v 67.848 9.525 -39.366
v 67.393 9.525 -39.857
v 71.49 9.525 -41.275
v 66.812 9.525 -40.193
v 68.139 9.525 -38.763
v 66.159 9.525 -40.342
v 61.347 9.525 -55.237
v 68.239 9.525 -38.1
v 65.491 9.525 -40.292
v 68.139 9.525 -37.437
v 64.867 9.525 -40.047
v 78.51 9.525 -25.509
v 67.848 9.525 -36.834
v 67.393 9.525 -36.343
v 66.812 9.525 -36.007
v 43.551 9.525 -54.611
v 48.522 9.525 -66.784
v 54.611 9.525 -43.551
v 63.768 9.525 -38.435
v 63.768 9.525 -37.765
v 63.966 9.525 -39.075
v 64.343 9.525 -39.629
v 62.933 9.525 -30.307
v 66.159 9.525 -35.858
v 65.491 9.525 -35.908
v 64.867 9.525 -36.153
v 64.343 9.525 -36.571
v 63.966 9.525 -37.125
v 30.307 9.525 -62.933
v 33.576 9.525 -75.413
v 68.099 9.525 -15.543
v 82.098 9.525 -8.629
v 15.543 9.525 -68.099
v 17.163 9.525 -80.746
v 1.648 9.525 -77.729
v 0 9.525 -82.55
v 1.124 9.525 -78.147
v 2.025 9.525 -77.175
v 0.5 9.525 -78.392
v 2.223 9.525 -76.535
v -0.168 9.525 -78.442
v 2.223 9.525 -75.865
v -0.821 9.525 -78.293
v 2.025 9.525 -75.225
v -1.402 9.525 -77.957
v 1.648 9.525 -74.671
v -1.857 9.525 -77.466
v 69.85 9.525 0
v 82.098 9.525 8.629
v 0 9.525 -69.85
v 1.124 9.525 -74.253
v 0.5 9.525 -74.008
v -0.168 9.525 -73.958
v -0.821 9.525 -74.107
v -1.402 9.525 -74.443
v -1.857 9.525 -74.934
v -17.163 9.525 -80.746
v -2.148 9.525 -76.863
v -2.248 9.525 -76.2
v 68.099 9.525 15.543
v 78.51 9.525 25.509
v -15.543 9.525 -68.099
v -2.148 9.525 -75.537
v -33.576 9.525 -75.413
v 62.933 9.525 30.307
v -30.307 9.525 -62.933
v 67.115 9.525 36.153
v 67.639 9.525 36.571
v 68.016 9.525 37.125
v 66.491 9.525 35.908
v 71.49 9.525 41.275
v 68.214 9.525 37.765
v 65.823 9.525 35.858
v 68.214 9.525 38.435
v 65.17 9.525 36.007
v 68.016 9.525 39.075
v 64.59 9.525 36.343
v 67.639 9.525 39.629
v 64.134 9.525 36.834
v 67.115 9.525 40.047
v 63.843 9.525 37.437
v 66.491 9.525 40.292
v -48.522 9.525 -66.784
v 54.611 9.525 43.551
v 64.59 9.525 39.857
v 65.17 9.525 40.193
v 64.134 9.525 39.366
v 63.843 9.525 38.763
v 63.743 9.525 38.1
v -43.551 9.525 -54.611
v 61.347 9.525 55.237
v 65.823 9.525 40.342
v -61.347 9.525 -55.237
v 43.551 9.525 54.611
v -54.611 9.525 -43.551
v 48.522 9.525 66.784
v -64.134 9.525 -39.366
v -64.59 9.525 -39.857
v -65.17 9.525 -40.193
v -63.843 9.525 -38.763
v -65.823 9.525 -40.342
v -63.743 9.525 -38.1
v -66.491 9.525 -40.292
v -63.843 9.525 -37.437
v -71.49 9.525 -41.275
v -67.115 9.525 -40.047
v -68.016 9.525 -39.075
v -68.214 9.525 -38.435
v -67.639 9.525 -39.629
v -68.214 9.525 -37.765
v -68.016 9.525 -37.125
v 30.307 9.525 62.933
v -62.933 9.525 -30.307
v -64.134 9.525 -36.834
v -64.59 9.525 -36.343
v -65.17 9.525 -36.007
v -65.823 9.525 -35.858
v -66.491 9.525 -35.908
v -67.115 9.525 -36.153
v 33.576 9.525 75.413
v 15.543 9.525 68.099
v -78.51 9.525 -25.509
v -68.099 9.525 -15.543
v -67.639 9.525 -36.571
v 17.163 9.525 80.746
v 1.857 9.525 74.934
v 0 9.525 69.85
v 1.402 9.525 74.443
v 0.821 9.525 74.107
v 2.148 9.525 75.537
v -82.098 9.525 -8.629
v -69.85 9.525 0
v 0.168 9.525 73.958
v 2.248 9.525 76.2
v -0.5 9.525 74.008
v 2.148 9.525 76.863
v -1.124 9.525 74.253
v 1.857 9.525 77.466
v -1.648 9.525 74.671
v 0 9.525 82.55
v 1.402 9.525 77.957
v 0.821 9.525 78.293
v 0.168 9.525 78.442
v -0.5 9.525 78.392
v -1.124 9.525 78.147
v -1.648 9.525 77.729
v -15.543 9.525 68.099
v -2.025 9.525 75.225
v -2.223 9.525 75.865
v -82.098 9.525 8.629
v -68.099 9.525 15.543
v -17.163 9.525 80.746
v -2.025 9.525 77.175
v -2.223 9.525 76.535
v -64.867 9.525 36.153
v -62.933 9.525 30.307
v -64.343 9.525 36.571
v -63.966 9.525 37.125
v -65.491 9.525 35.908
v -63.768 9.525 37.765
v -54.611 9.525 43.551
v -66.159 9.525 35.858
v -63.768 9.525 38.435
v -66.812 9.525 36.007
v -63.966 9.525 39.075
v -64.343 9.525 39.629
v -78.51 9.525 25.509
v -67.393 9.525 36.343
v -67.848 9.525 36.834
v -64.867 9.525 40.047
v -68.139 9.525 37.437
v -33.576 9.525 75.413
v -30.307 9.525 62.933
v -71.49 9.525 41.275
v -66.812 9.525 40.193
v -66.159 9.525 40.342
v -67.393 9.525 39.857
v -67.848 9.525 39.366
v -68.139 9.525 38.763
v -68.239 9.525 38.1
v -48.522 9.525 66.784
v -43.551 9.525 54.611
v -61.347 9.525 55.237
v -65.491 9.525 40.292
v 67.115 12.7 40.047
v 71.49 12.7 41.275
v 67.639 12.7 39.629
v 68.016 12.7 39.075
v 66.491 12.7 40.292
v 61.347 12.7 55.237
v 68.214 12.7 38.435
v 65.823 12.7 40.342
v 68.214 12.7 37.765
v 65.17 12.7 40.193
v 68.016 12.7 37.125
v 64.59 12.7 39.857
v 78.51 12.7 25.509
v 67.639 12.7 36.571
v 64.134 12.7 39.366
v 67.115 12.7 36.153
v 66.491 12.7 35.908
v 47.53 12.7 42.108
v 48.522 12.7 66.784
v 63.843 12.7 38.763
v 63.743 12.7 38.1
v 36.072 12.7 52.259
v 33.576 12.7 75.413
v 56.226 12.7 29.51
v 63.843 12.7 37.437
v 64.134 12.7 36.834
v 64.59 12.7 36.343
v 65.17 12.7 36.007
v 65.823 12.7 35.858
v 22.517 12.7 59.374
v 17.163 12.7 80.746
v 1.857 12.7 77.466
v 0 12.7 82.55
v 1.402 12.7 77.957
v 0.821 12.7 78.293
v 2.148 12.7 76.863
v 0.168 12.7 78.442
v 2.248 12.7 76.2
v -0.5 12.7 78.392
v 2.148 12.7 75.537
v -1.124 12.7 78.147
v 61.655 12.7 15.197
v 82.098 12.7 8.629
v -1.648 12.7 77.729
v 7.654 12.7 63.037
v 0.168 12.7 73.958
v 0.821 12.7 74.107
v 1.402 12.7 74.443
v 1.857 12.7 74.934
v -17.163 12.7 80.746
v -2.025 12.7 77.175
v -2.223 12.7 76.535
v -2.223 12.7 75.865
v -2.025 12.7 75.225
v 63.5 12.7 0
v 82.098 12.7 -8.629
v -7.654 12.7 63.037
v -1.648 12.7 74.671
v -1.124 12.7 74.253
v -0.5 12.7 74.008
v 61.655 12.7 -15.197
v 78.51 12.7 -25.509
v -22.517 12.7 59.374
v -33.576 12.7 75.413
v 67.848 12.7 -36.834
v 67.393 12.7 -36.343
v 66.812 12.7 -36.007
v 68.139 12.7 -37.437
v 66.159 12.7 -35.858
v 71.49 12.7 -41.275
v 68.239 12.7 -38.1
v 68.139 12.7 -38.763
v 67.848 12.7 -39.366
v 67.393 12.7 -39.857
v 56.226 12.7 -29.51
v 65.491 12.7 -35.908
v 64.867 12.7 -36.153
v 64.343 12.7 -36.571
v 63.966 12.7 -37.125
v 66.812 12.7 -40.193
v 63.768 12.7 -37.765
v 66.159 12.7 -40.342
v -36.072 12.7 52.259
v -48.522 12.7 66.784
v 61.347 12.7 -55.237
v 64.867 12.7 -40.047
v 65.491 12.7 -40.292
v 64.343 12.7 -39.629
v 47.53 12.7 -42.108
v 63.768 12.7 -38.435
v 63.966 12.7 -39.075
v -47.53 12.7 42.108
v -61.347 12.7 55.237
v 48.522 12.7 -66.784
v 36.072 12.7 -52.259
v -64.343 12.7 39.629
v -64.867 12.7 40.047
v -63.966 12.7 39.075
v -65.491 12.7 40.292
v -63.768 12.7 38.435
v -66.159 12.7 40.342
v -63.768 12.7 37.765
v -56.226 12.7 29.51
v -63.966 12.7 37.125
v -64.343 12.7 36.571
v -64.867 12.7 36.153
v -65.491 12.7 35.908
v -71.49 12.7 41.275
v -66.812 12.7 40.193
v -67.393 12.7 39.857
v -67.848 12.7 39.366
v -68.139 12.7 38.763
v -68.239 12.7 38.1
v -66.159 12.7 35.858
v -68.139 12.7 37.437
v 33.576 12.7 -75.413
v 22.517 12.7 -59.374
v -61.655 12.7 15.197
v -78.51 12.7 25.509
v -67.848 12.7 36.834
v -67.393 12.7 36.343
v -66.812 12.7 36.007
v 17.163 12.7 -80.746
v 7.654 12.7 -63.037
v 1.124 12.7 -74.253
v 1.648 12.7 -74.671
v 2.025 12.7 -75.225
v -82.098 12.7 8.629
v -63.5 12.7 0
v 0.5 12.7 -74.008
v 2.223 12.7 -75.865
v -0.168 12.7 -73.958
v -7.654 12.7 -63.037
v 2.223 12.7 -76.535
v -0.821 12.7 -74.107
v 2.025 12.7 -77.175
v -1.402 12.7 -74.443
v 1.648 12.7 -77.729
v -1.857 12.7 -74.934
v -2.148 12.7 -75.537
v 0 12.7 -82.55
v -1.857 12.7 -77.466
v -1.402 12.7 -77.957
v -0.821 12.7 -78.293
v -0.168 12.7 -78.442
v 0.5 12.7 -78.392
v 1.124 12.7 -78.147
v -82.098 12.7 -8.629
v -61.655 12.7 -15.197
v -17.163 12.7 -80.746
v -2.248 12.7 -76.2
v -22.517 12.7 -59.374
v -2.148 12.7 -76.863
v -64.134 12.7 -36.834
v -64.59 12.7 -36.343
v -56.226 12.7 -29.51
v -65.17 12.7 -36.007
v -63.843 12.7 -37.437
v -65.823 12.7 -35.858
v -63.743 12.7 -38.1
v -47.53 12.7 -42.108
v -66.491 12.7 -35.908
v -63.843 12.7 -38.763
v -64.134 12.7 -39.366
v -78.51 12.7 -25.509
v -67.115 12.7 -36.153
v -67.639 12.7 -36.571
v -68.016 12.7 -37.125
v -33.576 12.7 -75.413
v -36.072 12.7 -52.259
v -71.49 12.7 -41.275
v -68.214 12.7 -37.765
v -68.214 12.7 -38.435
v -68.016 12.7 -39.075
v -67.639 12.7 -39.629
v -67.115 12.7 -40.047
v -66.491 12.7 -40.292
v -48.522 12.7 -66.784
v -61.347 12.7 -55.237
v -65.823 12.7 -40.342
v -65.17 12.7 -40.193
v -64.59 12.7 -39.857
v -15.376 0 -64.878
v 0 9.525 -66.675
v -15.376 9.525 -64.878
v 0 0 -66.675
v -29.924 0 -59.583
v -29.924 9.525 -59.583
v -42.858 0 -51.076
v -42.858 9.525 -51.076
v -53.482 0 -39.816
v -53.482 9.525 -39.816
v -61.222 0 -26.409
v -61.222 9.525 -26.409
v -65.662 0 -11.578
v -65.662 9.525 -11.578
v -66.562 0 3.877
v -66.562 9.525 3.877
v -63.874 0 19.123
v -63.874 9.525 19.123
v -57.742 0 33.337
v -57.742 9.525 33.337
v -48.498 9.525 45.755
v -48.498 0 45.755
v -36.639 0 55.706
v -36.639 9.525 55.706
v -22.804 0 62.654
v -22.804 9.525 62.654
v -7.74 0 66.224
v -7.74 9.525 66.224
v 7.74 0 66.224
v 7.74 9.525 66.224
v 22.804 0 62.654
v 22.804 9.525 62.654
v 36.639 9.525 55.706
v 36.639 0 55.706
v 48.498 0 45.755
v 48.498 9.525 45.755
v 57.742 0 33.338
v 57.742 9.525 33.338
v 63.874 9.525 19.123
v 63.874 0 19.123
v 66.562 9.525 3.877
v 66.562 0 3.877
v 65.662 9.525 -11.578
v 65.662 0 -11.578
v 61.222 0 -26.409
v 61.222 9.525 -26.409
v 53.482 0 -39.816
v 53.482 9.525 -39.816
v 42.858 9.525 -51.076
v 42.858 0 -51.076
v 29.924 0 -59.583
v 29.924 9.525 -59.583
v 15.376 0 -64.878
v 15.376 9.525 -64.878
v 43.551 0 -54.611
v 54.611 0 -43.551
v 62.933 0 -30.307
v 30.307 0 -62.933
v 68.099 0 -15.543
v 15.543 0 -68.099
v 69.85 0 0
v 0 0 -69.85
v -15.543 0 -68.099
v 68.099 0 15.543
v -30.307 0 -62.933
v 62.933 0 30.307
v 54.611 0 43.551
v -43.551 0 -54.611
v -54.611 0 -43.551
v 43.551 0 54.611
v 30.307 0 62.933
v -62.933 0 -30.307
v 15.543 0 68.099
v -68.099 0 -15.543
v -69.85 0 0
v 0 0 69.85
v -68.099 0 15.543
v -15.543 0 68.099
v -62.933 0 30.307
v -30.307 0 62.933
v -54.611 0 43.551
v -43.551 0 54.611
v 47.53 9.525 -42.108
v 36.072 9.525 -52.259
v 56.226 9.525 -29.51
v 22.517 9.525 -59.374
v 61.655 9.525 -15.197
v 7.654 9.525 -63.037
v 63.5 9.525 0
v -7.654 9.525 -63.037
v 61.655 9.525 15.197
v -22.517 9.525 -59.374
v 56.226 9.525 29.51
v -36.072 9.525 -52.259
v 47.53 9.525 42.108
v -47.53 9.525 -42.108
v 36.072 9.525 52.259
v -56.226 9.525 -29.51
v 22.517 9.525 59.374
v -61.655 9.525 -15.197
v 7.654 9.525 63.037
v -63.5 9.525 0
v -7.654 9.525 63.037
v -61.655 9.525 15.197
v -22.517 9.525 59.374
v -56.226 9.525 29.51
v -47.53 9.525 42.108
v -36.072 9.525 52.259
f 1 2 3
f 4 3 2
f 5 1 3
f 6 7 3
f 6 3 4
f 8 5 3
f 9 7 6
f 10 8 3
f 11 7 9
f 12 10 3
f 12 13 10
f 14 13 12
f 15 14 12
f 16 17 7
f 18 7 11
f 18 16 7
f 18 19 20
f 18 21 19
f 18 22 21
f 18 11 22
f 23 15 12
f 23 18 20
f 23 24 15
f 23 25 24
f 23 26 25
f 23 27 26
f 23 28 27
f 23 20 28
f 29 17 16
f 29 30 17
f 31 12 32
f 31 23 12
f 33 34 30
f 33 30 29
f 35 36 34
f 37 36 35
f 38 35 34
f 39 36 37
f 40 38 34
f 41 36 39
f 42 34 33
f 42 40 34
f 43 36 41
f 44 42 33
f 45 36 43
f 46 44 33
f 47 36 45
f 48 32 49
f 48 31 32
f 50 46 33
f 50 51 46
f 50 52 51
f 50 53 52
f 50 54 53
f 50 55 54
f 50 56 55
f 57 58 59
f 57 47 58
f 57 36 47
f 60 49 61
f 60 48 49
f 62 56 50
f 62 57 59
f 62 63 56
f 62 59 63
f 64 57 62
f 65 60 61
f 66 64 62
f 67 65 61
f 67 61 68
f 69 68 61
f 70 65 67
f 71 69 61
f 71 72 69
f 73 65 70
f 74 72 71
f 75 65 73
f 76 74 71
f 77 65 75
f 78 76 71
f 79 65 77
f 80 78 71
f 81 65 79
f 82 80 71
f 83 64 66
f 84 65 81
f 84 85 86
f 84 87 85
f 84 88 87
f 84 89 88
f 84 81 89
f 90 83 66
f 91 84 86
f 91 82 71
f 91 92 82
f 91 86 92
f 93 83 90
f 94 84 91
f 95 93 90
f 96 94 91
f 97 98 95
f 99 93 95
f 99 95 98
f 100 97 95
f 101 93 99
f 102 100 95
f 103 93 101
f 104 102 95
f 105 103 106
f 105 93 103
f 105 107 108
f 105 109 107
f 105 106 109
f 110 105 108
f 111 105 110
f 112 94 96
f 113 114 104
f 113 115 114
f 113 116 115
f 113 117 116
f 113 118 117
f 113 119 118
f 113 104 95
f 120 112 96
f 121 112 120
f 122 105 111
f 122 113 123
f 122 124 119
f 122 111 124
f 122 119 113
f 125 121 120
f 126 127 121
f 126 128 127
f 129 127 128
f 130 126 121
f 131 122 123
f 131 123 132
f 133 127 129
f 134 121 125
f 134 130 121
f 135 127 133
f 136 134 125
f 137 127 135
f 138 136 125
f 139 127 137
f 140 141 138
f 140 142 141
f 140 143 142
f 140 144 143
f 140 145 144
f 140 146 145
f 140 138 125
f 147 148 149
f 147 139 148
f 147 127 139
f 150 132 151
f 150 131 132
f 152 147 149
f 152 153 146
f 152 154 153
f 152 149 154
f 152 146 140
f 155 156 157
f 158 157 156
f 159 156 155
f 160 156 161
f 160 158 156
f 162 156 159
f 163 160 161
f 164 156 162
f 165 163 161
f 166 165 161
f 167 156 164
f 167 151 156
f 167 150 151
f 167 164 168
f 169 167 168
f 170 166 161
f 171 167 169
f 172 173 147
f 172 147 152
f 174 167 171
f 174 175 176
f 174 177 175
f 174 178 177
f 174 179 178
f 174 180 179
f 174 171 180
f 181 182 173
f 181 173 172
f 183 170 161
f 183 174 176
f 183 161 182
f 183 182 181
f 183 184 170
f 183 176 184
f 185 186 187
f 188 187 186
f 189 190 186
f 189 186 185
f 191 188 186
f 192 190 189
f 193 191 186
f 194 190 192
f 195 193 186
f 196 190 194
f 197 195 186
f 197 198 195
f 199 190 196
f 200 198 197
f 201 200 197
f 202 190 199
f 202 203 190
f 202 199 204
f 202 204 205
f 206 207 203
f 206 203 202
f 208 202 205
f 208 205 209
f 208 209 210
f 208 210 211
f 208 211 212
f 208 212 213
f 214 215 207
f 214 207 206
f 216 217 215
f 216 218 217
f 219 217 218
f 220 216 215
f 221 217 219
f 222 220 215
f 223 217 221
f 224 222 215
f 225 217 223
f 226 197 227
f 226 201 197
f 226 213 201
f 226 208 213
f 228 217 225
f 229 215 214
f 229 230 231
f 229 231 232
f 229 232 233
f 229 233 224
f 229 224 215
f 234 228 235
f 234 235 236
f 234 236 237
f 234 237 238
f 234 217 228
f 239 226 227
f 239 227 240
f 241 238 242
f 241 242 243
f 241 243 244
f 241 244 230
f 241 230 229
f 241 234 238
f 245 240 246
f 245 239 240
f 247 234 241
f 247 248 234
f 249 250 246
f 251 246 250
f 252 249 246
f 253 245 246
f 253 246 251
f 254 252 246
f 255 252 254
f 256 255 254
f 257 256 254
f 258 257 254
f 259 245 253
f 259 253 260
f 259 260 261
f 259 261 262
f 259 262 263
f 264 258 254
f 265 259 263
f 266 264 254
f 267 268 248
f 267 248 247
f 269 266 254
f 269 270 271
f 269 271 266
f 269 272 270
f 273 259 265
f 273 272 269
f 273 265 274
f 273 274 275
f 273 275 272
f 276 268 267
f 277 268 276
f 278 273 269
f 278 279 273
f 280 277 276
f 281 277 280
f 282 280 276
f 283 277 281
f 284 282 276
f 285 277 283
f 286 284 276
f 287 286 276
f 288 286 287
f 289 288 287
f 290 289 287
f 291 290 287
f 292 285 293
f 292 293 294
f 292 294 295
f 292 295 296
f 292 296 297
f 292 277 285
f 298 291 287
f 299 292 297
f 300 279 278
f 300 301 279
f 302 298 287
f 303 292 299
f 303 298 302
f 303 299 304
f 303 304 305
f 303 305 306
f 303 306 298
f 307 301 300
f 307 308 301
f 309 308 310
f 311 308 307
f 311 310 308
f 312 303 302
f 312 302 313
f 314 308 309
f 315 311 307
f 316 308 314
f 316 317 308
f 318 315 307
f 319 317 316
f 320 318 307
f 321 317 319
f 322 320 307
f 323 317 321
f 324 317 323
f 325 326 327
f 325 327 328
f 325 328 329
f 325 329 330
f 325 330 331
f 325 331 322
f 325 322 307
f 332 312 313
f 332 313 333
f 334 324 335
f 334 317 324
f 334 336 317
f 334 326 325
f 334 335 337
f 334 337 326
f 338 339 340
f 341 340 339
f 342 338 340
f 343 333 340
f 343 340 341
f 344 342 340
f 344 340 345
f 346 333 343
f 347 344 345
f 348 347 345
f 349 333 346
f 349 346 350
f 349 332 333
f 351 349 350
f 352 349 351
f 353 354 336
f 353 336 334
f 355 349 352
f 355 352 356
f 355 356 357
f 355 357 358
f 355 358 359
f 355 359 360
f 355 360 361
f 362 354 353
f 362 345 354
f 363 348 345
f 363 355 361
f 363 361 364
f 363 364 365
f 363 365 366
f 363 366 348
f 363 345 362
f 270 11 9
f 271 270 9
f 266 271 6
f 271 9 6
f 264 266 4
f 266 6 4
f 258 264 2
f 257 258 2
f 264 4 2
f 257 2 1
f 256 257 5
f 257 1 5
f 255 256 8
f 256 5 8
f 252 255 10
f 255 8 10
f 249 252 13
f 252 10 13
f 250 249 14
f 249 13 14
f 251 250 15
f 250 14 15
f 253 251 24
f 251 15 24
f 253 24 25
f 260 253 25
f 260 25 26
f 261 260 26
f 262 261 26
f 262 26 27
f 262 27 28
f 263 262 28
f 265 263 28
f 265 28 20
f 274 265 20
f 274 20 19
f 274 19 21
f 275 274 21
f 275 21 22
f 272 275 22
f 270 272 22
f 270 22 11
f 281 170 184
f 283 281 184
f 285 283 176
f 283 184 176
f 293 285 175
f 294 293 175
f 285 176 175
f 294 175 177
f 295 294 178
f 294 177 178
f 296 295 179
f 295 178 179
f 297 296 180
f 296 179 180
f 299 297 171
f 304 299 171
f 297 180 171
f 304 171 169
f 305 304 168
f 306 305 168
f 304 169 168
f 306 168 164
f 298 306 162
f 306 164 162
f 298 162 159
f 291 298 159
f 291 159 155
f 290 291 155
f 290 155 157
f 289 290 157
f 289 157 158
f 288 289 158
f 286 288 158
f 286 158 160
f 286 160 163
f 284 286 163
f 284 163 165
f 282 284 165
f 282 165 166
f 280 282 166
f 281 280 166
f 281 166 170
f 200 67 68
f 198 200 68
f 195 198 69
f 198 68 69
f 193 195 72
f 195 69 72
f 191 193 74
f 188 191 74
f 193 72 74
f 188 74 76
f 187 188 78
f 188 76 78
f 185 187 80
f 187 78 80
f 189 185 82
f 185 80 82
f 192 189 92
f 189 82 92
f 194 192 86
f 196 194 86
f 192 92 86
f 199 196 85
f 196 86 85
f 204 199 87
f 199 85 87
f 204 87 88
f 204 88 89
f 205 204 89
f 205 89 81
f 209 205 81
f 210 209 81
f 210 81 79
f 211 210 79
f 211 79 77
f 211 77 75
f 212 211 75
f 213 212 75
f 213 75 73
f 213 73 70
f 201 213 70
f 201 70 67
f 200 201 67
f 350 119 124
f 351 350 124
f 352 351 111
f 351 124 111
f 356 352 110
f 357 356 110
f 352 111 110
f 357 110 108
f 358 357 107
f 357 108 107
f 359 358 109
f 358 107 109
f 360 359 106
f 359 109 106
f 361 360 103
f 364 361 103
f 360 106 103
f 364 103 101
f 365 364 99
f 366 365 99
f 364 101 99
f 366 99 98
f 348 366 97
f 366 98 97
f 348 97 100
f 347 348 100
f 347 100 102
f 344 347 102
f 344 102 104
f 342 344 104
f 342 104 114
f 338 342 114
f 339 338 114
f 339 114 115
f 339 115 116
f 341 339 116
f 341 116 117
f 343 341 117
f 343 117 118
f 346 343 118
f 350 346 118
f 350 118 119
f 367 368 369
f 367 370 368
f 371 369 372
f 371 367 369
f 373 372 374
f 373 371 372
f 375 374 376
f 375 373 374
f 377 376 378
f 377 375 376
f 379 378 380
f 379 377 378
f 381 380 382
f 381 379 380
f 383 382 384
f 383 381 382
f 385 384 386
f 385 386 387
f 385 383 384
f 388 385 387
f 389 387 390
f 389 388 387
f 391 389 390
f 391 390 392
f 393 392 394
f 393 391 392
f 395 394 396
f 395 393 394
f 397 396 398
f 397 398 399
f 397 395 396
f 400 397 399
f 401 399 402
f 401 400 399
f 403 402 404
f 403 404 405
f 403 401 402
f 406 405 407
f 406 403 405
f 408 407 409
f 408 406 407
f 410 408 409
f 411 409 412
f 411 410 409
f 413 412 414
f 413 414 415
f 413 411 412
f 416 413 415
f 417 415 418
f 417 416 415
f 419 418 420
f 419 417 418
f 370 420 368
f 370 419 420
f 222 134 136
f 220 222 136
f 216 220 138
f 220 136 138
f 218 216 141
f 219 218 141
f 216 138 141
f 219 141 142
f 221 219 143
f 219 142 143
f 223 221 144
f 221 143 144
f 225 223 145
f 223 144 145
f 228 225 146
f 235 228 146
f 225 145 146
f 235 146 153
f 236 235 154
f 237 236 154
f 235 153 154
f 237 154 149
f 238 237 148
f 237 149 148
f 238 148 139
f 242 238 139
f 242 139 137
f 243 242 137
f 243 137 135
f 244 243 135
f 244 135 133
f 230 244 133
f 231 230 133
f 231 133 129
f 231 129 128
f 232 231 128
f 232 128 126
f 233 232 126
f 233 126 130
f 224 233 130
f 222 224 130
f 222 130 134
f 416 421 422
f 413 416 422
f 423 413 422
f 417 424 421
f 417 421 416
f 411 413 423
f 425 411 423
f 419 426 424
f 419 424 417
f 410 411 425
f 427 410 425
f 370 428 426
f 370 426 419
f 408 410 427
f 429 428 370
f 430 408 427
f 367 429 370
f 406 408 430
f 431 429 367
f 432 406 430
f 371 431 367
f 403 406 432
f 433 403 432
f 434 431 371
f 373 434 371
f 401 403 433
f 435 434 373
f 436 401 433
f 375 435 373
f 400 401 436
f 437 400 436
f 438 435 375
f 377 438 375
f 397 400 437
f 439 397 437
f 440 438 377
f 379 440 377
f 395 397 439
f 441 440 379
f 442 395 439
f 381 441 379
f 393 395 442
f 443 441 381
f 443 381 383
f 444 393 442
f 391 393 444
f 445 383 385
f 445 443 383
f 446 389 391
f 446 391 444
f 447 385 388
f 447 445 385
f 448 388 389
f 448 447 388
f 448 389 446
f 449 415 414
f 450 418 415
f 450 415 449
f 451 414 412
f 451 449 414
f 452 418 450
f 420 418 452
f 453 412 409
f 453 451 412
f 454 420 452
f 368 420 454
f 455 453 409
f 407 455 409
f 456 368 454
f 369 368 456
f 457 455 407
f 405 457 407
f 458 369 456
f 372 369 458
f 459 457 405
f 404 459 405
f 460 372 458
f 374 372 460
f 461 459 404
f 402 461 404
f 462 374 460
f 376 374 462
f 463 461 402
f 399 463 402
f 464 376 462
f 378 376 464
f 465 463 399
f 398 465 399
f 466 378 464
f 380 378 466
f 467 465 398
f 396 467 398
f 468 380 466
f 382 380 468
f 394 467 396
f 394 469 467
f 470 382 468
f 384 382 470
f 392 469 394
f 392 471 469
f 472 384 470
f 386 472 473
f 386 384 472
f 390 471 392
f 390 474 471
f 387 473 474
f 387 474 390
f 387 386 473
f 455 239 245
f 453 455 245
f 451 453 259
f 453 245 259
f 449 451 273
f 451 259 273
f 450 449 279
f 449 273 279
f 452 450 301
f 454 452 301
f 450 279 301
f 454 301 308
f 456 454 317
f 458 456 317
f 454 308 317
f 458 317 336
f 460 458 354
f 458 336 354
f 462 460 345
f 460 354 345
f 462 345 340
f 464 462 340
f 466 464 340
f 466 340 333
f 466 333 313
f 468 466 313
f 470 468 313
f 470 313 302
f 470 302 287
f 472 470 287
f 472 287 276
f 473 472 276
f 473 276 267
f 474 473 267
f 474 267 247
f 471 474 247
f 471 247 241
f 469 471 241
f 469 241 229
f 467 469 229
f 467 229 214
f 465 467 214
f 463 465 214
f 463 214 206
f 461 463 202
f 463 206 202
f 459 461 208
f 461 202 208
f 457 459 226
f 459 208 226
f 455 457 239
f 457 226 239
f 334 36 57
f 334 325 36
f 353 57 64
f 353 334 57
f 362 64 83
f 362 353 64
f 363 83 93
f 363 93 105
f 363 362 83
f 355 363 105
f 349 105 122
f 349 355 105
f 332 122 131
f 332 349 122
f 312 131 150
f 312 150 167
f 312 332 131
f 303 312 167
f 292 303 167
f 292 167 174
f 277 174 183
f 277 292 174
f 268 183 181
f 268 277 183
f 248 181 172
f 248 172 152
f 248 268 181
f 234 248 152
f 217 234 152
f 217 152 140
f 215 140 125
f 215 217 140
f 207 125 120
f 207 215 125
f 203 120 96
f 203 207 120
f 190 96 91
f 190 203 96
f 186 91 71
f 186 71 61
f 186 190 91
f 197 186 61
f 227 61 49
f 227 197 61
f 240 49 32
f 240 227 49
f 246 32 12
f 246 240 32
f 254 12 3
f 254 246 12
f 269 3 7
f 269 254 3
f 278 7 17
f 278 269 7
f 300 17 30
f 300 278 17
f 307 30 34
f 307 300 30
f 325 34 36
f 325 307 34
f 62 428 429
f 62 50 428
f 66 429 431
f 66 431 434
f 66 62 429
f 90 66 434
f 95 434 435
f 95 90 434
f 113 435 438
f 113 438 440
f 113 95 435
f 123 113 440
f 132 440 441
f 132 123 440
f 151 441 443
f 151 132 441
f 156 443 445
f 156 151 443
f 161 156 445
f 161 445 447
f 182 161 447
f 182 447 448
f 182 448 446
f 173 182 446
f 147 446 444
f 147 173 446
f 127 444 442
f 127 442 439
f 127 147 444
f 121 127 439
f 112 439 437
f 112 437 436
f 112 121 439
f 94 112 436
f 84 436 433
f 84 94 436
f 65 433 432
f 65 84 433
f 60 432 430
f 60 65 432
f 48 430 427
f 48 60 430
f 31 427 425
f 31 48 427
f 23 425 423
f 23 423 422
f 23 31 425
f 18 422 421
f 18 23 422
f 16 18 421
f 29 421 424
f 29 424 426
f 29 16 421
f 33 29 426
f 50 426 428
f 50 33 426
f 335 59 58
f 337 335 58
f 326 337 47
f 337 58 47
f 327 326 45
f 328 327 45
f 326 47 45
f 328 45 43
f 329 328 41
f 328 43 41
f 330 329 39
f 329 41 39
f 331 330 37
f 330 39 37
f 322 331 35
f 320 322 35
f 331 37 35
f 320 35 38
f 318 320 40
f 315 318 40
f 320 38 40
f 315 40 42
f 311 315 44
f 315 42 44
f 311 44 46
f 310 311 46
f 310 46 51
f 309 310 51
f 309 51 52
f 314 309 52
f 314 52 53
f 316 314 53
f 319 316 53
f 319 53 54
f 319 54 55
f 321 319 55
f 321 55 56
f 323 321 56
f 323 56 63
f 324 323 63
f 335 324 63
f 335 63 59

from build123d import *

# Parameters (mm, degrees)
F_8_CLEARANCE_HOLE1_D     = 4.4958
F_8_CLEARANCE_HOLE1_DEPTH = 3.176
CIRPATTERN1_COUNT         = 6
SKETCH4_R                 = 63.5
CUT_EXTRUDE1_DEPTH        = 13.7


with BuildPart() as part:
    # Sketch1 → Revolve1 (revolve)
    with BuildSketch(Plane(origin=(0, 0, 0), x_dir=(0, 0, -1), z_dir=(1, 0, 0))):
        Polygon((66.675, 0), (69.85, 0), (69.85, 9.525), (82.55, 9.525), (82.55, 12.7), (0, 12.7), (0, 9.525), (66.675, 9.525), align=None)
    revolve(axis=Axis((0, 0, 0), (0, 1, 0)))

    # #8 Clearance Hole1
    with Locations(Plane(origin=(0, 12.7, 0), x_dir=(1, 0, 0), z_dir=(0, 1, 0))):
        with Locations((0, 76.2)):
            f_8_clearance_hole1 = Hole(F_8_CLEARANCE_HOLE1_D / 2, depth=F_8_CLEARANCE_HOLE1_DEPTH)

    # CirPattern1: #8 Clearance Hole1 ×6 about axis
    cirpattern1_axis = Axis((0, 0, 0), (0, 1, 0))
    for i in range(1, CIRPATTERN1_COUNT):
        add(f_8_clearance_hole1.rotate(cirpattern1_axis, i * 360 / CIRPATTERN1_COUNT), mode=Mode.SUBTRACT)

    # Sketch4 → Cut-Extrude1 (cut, through all)
    with BuildSketch(Plane(origin=(0, 12.7, 0), x_dir=(1, 0, 0), z_dir=(0, 1, 0))):
        Circle(SKETCH4_R)
    extrude(amount=-CUT_EXTRUDE1_DEPTH, mode=Mode.SUBTRACT)


solid = part.part
